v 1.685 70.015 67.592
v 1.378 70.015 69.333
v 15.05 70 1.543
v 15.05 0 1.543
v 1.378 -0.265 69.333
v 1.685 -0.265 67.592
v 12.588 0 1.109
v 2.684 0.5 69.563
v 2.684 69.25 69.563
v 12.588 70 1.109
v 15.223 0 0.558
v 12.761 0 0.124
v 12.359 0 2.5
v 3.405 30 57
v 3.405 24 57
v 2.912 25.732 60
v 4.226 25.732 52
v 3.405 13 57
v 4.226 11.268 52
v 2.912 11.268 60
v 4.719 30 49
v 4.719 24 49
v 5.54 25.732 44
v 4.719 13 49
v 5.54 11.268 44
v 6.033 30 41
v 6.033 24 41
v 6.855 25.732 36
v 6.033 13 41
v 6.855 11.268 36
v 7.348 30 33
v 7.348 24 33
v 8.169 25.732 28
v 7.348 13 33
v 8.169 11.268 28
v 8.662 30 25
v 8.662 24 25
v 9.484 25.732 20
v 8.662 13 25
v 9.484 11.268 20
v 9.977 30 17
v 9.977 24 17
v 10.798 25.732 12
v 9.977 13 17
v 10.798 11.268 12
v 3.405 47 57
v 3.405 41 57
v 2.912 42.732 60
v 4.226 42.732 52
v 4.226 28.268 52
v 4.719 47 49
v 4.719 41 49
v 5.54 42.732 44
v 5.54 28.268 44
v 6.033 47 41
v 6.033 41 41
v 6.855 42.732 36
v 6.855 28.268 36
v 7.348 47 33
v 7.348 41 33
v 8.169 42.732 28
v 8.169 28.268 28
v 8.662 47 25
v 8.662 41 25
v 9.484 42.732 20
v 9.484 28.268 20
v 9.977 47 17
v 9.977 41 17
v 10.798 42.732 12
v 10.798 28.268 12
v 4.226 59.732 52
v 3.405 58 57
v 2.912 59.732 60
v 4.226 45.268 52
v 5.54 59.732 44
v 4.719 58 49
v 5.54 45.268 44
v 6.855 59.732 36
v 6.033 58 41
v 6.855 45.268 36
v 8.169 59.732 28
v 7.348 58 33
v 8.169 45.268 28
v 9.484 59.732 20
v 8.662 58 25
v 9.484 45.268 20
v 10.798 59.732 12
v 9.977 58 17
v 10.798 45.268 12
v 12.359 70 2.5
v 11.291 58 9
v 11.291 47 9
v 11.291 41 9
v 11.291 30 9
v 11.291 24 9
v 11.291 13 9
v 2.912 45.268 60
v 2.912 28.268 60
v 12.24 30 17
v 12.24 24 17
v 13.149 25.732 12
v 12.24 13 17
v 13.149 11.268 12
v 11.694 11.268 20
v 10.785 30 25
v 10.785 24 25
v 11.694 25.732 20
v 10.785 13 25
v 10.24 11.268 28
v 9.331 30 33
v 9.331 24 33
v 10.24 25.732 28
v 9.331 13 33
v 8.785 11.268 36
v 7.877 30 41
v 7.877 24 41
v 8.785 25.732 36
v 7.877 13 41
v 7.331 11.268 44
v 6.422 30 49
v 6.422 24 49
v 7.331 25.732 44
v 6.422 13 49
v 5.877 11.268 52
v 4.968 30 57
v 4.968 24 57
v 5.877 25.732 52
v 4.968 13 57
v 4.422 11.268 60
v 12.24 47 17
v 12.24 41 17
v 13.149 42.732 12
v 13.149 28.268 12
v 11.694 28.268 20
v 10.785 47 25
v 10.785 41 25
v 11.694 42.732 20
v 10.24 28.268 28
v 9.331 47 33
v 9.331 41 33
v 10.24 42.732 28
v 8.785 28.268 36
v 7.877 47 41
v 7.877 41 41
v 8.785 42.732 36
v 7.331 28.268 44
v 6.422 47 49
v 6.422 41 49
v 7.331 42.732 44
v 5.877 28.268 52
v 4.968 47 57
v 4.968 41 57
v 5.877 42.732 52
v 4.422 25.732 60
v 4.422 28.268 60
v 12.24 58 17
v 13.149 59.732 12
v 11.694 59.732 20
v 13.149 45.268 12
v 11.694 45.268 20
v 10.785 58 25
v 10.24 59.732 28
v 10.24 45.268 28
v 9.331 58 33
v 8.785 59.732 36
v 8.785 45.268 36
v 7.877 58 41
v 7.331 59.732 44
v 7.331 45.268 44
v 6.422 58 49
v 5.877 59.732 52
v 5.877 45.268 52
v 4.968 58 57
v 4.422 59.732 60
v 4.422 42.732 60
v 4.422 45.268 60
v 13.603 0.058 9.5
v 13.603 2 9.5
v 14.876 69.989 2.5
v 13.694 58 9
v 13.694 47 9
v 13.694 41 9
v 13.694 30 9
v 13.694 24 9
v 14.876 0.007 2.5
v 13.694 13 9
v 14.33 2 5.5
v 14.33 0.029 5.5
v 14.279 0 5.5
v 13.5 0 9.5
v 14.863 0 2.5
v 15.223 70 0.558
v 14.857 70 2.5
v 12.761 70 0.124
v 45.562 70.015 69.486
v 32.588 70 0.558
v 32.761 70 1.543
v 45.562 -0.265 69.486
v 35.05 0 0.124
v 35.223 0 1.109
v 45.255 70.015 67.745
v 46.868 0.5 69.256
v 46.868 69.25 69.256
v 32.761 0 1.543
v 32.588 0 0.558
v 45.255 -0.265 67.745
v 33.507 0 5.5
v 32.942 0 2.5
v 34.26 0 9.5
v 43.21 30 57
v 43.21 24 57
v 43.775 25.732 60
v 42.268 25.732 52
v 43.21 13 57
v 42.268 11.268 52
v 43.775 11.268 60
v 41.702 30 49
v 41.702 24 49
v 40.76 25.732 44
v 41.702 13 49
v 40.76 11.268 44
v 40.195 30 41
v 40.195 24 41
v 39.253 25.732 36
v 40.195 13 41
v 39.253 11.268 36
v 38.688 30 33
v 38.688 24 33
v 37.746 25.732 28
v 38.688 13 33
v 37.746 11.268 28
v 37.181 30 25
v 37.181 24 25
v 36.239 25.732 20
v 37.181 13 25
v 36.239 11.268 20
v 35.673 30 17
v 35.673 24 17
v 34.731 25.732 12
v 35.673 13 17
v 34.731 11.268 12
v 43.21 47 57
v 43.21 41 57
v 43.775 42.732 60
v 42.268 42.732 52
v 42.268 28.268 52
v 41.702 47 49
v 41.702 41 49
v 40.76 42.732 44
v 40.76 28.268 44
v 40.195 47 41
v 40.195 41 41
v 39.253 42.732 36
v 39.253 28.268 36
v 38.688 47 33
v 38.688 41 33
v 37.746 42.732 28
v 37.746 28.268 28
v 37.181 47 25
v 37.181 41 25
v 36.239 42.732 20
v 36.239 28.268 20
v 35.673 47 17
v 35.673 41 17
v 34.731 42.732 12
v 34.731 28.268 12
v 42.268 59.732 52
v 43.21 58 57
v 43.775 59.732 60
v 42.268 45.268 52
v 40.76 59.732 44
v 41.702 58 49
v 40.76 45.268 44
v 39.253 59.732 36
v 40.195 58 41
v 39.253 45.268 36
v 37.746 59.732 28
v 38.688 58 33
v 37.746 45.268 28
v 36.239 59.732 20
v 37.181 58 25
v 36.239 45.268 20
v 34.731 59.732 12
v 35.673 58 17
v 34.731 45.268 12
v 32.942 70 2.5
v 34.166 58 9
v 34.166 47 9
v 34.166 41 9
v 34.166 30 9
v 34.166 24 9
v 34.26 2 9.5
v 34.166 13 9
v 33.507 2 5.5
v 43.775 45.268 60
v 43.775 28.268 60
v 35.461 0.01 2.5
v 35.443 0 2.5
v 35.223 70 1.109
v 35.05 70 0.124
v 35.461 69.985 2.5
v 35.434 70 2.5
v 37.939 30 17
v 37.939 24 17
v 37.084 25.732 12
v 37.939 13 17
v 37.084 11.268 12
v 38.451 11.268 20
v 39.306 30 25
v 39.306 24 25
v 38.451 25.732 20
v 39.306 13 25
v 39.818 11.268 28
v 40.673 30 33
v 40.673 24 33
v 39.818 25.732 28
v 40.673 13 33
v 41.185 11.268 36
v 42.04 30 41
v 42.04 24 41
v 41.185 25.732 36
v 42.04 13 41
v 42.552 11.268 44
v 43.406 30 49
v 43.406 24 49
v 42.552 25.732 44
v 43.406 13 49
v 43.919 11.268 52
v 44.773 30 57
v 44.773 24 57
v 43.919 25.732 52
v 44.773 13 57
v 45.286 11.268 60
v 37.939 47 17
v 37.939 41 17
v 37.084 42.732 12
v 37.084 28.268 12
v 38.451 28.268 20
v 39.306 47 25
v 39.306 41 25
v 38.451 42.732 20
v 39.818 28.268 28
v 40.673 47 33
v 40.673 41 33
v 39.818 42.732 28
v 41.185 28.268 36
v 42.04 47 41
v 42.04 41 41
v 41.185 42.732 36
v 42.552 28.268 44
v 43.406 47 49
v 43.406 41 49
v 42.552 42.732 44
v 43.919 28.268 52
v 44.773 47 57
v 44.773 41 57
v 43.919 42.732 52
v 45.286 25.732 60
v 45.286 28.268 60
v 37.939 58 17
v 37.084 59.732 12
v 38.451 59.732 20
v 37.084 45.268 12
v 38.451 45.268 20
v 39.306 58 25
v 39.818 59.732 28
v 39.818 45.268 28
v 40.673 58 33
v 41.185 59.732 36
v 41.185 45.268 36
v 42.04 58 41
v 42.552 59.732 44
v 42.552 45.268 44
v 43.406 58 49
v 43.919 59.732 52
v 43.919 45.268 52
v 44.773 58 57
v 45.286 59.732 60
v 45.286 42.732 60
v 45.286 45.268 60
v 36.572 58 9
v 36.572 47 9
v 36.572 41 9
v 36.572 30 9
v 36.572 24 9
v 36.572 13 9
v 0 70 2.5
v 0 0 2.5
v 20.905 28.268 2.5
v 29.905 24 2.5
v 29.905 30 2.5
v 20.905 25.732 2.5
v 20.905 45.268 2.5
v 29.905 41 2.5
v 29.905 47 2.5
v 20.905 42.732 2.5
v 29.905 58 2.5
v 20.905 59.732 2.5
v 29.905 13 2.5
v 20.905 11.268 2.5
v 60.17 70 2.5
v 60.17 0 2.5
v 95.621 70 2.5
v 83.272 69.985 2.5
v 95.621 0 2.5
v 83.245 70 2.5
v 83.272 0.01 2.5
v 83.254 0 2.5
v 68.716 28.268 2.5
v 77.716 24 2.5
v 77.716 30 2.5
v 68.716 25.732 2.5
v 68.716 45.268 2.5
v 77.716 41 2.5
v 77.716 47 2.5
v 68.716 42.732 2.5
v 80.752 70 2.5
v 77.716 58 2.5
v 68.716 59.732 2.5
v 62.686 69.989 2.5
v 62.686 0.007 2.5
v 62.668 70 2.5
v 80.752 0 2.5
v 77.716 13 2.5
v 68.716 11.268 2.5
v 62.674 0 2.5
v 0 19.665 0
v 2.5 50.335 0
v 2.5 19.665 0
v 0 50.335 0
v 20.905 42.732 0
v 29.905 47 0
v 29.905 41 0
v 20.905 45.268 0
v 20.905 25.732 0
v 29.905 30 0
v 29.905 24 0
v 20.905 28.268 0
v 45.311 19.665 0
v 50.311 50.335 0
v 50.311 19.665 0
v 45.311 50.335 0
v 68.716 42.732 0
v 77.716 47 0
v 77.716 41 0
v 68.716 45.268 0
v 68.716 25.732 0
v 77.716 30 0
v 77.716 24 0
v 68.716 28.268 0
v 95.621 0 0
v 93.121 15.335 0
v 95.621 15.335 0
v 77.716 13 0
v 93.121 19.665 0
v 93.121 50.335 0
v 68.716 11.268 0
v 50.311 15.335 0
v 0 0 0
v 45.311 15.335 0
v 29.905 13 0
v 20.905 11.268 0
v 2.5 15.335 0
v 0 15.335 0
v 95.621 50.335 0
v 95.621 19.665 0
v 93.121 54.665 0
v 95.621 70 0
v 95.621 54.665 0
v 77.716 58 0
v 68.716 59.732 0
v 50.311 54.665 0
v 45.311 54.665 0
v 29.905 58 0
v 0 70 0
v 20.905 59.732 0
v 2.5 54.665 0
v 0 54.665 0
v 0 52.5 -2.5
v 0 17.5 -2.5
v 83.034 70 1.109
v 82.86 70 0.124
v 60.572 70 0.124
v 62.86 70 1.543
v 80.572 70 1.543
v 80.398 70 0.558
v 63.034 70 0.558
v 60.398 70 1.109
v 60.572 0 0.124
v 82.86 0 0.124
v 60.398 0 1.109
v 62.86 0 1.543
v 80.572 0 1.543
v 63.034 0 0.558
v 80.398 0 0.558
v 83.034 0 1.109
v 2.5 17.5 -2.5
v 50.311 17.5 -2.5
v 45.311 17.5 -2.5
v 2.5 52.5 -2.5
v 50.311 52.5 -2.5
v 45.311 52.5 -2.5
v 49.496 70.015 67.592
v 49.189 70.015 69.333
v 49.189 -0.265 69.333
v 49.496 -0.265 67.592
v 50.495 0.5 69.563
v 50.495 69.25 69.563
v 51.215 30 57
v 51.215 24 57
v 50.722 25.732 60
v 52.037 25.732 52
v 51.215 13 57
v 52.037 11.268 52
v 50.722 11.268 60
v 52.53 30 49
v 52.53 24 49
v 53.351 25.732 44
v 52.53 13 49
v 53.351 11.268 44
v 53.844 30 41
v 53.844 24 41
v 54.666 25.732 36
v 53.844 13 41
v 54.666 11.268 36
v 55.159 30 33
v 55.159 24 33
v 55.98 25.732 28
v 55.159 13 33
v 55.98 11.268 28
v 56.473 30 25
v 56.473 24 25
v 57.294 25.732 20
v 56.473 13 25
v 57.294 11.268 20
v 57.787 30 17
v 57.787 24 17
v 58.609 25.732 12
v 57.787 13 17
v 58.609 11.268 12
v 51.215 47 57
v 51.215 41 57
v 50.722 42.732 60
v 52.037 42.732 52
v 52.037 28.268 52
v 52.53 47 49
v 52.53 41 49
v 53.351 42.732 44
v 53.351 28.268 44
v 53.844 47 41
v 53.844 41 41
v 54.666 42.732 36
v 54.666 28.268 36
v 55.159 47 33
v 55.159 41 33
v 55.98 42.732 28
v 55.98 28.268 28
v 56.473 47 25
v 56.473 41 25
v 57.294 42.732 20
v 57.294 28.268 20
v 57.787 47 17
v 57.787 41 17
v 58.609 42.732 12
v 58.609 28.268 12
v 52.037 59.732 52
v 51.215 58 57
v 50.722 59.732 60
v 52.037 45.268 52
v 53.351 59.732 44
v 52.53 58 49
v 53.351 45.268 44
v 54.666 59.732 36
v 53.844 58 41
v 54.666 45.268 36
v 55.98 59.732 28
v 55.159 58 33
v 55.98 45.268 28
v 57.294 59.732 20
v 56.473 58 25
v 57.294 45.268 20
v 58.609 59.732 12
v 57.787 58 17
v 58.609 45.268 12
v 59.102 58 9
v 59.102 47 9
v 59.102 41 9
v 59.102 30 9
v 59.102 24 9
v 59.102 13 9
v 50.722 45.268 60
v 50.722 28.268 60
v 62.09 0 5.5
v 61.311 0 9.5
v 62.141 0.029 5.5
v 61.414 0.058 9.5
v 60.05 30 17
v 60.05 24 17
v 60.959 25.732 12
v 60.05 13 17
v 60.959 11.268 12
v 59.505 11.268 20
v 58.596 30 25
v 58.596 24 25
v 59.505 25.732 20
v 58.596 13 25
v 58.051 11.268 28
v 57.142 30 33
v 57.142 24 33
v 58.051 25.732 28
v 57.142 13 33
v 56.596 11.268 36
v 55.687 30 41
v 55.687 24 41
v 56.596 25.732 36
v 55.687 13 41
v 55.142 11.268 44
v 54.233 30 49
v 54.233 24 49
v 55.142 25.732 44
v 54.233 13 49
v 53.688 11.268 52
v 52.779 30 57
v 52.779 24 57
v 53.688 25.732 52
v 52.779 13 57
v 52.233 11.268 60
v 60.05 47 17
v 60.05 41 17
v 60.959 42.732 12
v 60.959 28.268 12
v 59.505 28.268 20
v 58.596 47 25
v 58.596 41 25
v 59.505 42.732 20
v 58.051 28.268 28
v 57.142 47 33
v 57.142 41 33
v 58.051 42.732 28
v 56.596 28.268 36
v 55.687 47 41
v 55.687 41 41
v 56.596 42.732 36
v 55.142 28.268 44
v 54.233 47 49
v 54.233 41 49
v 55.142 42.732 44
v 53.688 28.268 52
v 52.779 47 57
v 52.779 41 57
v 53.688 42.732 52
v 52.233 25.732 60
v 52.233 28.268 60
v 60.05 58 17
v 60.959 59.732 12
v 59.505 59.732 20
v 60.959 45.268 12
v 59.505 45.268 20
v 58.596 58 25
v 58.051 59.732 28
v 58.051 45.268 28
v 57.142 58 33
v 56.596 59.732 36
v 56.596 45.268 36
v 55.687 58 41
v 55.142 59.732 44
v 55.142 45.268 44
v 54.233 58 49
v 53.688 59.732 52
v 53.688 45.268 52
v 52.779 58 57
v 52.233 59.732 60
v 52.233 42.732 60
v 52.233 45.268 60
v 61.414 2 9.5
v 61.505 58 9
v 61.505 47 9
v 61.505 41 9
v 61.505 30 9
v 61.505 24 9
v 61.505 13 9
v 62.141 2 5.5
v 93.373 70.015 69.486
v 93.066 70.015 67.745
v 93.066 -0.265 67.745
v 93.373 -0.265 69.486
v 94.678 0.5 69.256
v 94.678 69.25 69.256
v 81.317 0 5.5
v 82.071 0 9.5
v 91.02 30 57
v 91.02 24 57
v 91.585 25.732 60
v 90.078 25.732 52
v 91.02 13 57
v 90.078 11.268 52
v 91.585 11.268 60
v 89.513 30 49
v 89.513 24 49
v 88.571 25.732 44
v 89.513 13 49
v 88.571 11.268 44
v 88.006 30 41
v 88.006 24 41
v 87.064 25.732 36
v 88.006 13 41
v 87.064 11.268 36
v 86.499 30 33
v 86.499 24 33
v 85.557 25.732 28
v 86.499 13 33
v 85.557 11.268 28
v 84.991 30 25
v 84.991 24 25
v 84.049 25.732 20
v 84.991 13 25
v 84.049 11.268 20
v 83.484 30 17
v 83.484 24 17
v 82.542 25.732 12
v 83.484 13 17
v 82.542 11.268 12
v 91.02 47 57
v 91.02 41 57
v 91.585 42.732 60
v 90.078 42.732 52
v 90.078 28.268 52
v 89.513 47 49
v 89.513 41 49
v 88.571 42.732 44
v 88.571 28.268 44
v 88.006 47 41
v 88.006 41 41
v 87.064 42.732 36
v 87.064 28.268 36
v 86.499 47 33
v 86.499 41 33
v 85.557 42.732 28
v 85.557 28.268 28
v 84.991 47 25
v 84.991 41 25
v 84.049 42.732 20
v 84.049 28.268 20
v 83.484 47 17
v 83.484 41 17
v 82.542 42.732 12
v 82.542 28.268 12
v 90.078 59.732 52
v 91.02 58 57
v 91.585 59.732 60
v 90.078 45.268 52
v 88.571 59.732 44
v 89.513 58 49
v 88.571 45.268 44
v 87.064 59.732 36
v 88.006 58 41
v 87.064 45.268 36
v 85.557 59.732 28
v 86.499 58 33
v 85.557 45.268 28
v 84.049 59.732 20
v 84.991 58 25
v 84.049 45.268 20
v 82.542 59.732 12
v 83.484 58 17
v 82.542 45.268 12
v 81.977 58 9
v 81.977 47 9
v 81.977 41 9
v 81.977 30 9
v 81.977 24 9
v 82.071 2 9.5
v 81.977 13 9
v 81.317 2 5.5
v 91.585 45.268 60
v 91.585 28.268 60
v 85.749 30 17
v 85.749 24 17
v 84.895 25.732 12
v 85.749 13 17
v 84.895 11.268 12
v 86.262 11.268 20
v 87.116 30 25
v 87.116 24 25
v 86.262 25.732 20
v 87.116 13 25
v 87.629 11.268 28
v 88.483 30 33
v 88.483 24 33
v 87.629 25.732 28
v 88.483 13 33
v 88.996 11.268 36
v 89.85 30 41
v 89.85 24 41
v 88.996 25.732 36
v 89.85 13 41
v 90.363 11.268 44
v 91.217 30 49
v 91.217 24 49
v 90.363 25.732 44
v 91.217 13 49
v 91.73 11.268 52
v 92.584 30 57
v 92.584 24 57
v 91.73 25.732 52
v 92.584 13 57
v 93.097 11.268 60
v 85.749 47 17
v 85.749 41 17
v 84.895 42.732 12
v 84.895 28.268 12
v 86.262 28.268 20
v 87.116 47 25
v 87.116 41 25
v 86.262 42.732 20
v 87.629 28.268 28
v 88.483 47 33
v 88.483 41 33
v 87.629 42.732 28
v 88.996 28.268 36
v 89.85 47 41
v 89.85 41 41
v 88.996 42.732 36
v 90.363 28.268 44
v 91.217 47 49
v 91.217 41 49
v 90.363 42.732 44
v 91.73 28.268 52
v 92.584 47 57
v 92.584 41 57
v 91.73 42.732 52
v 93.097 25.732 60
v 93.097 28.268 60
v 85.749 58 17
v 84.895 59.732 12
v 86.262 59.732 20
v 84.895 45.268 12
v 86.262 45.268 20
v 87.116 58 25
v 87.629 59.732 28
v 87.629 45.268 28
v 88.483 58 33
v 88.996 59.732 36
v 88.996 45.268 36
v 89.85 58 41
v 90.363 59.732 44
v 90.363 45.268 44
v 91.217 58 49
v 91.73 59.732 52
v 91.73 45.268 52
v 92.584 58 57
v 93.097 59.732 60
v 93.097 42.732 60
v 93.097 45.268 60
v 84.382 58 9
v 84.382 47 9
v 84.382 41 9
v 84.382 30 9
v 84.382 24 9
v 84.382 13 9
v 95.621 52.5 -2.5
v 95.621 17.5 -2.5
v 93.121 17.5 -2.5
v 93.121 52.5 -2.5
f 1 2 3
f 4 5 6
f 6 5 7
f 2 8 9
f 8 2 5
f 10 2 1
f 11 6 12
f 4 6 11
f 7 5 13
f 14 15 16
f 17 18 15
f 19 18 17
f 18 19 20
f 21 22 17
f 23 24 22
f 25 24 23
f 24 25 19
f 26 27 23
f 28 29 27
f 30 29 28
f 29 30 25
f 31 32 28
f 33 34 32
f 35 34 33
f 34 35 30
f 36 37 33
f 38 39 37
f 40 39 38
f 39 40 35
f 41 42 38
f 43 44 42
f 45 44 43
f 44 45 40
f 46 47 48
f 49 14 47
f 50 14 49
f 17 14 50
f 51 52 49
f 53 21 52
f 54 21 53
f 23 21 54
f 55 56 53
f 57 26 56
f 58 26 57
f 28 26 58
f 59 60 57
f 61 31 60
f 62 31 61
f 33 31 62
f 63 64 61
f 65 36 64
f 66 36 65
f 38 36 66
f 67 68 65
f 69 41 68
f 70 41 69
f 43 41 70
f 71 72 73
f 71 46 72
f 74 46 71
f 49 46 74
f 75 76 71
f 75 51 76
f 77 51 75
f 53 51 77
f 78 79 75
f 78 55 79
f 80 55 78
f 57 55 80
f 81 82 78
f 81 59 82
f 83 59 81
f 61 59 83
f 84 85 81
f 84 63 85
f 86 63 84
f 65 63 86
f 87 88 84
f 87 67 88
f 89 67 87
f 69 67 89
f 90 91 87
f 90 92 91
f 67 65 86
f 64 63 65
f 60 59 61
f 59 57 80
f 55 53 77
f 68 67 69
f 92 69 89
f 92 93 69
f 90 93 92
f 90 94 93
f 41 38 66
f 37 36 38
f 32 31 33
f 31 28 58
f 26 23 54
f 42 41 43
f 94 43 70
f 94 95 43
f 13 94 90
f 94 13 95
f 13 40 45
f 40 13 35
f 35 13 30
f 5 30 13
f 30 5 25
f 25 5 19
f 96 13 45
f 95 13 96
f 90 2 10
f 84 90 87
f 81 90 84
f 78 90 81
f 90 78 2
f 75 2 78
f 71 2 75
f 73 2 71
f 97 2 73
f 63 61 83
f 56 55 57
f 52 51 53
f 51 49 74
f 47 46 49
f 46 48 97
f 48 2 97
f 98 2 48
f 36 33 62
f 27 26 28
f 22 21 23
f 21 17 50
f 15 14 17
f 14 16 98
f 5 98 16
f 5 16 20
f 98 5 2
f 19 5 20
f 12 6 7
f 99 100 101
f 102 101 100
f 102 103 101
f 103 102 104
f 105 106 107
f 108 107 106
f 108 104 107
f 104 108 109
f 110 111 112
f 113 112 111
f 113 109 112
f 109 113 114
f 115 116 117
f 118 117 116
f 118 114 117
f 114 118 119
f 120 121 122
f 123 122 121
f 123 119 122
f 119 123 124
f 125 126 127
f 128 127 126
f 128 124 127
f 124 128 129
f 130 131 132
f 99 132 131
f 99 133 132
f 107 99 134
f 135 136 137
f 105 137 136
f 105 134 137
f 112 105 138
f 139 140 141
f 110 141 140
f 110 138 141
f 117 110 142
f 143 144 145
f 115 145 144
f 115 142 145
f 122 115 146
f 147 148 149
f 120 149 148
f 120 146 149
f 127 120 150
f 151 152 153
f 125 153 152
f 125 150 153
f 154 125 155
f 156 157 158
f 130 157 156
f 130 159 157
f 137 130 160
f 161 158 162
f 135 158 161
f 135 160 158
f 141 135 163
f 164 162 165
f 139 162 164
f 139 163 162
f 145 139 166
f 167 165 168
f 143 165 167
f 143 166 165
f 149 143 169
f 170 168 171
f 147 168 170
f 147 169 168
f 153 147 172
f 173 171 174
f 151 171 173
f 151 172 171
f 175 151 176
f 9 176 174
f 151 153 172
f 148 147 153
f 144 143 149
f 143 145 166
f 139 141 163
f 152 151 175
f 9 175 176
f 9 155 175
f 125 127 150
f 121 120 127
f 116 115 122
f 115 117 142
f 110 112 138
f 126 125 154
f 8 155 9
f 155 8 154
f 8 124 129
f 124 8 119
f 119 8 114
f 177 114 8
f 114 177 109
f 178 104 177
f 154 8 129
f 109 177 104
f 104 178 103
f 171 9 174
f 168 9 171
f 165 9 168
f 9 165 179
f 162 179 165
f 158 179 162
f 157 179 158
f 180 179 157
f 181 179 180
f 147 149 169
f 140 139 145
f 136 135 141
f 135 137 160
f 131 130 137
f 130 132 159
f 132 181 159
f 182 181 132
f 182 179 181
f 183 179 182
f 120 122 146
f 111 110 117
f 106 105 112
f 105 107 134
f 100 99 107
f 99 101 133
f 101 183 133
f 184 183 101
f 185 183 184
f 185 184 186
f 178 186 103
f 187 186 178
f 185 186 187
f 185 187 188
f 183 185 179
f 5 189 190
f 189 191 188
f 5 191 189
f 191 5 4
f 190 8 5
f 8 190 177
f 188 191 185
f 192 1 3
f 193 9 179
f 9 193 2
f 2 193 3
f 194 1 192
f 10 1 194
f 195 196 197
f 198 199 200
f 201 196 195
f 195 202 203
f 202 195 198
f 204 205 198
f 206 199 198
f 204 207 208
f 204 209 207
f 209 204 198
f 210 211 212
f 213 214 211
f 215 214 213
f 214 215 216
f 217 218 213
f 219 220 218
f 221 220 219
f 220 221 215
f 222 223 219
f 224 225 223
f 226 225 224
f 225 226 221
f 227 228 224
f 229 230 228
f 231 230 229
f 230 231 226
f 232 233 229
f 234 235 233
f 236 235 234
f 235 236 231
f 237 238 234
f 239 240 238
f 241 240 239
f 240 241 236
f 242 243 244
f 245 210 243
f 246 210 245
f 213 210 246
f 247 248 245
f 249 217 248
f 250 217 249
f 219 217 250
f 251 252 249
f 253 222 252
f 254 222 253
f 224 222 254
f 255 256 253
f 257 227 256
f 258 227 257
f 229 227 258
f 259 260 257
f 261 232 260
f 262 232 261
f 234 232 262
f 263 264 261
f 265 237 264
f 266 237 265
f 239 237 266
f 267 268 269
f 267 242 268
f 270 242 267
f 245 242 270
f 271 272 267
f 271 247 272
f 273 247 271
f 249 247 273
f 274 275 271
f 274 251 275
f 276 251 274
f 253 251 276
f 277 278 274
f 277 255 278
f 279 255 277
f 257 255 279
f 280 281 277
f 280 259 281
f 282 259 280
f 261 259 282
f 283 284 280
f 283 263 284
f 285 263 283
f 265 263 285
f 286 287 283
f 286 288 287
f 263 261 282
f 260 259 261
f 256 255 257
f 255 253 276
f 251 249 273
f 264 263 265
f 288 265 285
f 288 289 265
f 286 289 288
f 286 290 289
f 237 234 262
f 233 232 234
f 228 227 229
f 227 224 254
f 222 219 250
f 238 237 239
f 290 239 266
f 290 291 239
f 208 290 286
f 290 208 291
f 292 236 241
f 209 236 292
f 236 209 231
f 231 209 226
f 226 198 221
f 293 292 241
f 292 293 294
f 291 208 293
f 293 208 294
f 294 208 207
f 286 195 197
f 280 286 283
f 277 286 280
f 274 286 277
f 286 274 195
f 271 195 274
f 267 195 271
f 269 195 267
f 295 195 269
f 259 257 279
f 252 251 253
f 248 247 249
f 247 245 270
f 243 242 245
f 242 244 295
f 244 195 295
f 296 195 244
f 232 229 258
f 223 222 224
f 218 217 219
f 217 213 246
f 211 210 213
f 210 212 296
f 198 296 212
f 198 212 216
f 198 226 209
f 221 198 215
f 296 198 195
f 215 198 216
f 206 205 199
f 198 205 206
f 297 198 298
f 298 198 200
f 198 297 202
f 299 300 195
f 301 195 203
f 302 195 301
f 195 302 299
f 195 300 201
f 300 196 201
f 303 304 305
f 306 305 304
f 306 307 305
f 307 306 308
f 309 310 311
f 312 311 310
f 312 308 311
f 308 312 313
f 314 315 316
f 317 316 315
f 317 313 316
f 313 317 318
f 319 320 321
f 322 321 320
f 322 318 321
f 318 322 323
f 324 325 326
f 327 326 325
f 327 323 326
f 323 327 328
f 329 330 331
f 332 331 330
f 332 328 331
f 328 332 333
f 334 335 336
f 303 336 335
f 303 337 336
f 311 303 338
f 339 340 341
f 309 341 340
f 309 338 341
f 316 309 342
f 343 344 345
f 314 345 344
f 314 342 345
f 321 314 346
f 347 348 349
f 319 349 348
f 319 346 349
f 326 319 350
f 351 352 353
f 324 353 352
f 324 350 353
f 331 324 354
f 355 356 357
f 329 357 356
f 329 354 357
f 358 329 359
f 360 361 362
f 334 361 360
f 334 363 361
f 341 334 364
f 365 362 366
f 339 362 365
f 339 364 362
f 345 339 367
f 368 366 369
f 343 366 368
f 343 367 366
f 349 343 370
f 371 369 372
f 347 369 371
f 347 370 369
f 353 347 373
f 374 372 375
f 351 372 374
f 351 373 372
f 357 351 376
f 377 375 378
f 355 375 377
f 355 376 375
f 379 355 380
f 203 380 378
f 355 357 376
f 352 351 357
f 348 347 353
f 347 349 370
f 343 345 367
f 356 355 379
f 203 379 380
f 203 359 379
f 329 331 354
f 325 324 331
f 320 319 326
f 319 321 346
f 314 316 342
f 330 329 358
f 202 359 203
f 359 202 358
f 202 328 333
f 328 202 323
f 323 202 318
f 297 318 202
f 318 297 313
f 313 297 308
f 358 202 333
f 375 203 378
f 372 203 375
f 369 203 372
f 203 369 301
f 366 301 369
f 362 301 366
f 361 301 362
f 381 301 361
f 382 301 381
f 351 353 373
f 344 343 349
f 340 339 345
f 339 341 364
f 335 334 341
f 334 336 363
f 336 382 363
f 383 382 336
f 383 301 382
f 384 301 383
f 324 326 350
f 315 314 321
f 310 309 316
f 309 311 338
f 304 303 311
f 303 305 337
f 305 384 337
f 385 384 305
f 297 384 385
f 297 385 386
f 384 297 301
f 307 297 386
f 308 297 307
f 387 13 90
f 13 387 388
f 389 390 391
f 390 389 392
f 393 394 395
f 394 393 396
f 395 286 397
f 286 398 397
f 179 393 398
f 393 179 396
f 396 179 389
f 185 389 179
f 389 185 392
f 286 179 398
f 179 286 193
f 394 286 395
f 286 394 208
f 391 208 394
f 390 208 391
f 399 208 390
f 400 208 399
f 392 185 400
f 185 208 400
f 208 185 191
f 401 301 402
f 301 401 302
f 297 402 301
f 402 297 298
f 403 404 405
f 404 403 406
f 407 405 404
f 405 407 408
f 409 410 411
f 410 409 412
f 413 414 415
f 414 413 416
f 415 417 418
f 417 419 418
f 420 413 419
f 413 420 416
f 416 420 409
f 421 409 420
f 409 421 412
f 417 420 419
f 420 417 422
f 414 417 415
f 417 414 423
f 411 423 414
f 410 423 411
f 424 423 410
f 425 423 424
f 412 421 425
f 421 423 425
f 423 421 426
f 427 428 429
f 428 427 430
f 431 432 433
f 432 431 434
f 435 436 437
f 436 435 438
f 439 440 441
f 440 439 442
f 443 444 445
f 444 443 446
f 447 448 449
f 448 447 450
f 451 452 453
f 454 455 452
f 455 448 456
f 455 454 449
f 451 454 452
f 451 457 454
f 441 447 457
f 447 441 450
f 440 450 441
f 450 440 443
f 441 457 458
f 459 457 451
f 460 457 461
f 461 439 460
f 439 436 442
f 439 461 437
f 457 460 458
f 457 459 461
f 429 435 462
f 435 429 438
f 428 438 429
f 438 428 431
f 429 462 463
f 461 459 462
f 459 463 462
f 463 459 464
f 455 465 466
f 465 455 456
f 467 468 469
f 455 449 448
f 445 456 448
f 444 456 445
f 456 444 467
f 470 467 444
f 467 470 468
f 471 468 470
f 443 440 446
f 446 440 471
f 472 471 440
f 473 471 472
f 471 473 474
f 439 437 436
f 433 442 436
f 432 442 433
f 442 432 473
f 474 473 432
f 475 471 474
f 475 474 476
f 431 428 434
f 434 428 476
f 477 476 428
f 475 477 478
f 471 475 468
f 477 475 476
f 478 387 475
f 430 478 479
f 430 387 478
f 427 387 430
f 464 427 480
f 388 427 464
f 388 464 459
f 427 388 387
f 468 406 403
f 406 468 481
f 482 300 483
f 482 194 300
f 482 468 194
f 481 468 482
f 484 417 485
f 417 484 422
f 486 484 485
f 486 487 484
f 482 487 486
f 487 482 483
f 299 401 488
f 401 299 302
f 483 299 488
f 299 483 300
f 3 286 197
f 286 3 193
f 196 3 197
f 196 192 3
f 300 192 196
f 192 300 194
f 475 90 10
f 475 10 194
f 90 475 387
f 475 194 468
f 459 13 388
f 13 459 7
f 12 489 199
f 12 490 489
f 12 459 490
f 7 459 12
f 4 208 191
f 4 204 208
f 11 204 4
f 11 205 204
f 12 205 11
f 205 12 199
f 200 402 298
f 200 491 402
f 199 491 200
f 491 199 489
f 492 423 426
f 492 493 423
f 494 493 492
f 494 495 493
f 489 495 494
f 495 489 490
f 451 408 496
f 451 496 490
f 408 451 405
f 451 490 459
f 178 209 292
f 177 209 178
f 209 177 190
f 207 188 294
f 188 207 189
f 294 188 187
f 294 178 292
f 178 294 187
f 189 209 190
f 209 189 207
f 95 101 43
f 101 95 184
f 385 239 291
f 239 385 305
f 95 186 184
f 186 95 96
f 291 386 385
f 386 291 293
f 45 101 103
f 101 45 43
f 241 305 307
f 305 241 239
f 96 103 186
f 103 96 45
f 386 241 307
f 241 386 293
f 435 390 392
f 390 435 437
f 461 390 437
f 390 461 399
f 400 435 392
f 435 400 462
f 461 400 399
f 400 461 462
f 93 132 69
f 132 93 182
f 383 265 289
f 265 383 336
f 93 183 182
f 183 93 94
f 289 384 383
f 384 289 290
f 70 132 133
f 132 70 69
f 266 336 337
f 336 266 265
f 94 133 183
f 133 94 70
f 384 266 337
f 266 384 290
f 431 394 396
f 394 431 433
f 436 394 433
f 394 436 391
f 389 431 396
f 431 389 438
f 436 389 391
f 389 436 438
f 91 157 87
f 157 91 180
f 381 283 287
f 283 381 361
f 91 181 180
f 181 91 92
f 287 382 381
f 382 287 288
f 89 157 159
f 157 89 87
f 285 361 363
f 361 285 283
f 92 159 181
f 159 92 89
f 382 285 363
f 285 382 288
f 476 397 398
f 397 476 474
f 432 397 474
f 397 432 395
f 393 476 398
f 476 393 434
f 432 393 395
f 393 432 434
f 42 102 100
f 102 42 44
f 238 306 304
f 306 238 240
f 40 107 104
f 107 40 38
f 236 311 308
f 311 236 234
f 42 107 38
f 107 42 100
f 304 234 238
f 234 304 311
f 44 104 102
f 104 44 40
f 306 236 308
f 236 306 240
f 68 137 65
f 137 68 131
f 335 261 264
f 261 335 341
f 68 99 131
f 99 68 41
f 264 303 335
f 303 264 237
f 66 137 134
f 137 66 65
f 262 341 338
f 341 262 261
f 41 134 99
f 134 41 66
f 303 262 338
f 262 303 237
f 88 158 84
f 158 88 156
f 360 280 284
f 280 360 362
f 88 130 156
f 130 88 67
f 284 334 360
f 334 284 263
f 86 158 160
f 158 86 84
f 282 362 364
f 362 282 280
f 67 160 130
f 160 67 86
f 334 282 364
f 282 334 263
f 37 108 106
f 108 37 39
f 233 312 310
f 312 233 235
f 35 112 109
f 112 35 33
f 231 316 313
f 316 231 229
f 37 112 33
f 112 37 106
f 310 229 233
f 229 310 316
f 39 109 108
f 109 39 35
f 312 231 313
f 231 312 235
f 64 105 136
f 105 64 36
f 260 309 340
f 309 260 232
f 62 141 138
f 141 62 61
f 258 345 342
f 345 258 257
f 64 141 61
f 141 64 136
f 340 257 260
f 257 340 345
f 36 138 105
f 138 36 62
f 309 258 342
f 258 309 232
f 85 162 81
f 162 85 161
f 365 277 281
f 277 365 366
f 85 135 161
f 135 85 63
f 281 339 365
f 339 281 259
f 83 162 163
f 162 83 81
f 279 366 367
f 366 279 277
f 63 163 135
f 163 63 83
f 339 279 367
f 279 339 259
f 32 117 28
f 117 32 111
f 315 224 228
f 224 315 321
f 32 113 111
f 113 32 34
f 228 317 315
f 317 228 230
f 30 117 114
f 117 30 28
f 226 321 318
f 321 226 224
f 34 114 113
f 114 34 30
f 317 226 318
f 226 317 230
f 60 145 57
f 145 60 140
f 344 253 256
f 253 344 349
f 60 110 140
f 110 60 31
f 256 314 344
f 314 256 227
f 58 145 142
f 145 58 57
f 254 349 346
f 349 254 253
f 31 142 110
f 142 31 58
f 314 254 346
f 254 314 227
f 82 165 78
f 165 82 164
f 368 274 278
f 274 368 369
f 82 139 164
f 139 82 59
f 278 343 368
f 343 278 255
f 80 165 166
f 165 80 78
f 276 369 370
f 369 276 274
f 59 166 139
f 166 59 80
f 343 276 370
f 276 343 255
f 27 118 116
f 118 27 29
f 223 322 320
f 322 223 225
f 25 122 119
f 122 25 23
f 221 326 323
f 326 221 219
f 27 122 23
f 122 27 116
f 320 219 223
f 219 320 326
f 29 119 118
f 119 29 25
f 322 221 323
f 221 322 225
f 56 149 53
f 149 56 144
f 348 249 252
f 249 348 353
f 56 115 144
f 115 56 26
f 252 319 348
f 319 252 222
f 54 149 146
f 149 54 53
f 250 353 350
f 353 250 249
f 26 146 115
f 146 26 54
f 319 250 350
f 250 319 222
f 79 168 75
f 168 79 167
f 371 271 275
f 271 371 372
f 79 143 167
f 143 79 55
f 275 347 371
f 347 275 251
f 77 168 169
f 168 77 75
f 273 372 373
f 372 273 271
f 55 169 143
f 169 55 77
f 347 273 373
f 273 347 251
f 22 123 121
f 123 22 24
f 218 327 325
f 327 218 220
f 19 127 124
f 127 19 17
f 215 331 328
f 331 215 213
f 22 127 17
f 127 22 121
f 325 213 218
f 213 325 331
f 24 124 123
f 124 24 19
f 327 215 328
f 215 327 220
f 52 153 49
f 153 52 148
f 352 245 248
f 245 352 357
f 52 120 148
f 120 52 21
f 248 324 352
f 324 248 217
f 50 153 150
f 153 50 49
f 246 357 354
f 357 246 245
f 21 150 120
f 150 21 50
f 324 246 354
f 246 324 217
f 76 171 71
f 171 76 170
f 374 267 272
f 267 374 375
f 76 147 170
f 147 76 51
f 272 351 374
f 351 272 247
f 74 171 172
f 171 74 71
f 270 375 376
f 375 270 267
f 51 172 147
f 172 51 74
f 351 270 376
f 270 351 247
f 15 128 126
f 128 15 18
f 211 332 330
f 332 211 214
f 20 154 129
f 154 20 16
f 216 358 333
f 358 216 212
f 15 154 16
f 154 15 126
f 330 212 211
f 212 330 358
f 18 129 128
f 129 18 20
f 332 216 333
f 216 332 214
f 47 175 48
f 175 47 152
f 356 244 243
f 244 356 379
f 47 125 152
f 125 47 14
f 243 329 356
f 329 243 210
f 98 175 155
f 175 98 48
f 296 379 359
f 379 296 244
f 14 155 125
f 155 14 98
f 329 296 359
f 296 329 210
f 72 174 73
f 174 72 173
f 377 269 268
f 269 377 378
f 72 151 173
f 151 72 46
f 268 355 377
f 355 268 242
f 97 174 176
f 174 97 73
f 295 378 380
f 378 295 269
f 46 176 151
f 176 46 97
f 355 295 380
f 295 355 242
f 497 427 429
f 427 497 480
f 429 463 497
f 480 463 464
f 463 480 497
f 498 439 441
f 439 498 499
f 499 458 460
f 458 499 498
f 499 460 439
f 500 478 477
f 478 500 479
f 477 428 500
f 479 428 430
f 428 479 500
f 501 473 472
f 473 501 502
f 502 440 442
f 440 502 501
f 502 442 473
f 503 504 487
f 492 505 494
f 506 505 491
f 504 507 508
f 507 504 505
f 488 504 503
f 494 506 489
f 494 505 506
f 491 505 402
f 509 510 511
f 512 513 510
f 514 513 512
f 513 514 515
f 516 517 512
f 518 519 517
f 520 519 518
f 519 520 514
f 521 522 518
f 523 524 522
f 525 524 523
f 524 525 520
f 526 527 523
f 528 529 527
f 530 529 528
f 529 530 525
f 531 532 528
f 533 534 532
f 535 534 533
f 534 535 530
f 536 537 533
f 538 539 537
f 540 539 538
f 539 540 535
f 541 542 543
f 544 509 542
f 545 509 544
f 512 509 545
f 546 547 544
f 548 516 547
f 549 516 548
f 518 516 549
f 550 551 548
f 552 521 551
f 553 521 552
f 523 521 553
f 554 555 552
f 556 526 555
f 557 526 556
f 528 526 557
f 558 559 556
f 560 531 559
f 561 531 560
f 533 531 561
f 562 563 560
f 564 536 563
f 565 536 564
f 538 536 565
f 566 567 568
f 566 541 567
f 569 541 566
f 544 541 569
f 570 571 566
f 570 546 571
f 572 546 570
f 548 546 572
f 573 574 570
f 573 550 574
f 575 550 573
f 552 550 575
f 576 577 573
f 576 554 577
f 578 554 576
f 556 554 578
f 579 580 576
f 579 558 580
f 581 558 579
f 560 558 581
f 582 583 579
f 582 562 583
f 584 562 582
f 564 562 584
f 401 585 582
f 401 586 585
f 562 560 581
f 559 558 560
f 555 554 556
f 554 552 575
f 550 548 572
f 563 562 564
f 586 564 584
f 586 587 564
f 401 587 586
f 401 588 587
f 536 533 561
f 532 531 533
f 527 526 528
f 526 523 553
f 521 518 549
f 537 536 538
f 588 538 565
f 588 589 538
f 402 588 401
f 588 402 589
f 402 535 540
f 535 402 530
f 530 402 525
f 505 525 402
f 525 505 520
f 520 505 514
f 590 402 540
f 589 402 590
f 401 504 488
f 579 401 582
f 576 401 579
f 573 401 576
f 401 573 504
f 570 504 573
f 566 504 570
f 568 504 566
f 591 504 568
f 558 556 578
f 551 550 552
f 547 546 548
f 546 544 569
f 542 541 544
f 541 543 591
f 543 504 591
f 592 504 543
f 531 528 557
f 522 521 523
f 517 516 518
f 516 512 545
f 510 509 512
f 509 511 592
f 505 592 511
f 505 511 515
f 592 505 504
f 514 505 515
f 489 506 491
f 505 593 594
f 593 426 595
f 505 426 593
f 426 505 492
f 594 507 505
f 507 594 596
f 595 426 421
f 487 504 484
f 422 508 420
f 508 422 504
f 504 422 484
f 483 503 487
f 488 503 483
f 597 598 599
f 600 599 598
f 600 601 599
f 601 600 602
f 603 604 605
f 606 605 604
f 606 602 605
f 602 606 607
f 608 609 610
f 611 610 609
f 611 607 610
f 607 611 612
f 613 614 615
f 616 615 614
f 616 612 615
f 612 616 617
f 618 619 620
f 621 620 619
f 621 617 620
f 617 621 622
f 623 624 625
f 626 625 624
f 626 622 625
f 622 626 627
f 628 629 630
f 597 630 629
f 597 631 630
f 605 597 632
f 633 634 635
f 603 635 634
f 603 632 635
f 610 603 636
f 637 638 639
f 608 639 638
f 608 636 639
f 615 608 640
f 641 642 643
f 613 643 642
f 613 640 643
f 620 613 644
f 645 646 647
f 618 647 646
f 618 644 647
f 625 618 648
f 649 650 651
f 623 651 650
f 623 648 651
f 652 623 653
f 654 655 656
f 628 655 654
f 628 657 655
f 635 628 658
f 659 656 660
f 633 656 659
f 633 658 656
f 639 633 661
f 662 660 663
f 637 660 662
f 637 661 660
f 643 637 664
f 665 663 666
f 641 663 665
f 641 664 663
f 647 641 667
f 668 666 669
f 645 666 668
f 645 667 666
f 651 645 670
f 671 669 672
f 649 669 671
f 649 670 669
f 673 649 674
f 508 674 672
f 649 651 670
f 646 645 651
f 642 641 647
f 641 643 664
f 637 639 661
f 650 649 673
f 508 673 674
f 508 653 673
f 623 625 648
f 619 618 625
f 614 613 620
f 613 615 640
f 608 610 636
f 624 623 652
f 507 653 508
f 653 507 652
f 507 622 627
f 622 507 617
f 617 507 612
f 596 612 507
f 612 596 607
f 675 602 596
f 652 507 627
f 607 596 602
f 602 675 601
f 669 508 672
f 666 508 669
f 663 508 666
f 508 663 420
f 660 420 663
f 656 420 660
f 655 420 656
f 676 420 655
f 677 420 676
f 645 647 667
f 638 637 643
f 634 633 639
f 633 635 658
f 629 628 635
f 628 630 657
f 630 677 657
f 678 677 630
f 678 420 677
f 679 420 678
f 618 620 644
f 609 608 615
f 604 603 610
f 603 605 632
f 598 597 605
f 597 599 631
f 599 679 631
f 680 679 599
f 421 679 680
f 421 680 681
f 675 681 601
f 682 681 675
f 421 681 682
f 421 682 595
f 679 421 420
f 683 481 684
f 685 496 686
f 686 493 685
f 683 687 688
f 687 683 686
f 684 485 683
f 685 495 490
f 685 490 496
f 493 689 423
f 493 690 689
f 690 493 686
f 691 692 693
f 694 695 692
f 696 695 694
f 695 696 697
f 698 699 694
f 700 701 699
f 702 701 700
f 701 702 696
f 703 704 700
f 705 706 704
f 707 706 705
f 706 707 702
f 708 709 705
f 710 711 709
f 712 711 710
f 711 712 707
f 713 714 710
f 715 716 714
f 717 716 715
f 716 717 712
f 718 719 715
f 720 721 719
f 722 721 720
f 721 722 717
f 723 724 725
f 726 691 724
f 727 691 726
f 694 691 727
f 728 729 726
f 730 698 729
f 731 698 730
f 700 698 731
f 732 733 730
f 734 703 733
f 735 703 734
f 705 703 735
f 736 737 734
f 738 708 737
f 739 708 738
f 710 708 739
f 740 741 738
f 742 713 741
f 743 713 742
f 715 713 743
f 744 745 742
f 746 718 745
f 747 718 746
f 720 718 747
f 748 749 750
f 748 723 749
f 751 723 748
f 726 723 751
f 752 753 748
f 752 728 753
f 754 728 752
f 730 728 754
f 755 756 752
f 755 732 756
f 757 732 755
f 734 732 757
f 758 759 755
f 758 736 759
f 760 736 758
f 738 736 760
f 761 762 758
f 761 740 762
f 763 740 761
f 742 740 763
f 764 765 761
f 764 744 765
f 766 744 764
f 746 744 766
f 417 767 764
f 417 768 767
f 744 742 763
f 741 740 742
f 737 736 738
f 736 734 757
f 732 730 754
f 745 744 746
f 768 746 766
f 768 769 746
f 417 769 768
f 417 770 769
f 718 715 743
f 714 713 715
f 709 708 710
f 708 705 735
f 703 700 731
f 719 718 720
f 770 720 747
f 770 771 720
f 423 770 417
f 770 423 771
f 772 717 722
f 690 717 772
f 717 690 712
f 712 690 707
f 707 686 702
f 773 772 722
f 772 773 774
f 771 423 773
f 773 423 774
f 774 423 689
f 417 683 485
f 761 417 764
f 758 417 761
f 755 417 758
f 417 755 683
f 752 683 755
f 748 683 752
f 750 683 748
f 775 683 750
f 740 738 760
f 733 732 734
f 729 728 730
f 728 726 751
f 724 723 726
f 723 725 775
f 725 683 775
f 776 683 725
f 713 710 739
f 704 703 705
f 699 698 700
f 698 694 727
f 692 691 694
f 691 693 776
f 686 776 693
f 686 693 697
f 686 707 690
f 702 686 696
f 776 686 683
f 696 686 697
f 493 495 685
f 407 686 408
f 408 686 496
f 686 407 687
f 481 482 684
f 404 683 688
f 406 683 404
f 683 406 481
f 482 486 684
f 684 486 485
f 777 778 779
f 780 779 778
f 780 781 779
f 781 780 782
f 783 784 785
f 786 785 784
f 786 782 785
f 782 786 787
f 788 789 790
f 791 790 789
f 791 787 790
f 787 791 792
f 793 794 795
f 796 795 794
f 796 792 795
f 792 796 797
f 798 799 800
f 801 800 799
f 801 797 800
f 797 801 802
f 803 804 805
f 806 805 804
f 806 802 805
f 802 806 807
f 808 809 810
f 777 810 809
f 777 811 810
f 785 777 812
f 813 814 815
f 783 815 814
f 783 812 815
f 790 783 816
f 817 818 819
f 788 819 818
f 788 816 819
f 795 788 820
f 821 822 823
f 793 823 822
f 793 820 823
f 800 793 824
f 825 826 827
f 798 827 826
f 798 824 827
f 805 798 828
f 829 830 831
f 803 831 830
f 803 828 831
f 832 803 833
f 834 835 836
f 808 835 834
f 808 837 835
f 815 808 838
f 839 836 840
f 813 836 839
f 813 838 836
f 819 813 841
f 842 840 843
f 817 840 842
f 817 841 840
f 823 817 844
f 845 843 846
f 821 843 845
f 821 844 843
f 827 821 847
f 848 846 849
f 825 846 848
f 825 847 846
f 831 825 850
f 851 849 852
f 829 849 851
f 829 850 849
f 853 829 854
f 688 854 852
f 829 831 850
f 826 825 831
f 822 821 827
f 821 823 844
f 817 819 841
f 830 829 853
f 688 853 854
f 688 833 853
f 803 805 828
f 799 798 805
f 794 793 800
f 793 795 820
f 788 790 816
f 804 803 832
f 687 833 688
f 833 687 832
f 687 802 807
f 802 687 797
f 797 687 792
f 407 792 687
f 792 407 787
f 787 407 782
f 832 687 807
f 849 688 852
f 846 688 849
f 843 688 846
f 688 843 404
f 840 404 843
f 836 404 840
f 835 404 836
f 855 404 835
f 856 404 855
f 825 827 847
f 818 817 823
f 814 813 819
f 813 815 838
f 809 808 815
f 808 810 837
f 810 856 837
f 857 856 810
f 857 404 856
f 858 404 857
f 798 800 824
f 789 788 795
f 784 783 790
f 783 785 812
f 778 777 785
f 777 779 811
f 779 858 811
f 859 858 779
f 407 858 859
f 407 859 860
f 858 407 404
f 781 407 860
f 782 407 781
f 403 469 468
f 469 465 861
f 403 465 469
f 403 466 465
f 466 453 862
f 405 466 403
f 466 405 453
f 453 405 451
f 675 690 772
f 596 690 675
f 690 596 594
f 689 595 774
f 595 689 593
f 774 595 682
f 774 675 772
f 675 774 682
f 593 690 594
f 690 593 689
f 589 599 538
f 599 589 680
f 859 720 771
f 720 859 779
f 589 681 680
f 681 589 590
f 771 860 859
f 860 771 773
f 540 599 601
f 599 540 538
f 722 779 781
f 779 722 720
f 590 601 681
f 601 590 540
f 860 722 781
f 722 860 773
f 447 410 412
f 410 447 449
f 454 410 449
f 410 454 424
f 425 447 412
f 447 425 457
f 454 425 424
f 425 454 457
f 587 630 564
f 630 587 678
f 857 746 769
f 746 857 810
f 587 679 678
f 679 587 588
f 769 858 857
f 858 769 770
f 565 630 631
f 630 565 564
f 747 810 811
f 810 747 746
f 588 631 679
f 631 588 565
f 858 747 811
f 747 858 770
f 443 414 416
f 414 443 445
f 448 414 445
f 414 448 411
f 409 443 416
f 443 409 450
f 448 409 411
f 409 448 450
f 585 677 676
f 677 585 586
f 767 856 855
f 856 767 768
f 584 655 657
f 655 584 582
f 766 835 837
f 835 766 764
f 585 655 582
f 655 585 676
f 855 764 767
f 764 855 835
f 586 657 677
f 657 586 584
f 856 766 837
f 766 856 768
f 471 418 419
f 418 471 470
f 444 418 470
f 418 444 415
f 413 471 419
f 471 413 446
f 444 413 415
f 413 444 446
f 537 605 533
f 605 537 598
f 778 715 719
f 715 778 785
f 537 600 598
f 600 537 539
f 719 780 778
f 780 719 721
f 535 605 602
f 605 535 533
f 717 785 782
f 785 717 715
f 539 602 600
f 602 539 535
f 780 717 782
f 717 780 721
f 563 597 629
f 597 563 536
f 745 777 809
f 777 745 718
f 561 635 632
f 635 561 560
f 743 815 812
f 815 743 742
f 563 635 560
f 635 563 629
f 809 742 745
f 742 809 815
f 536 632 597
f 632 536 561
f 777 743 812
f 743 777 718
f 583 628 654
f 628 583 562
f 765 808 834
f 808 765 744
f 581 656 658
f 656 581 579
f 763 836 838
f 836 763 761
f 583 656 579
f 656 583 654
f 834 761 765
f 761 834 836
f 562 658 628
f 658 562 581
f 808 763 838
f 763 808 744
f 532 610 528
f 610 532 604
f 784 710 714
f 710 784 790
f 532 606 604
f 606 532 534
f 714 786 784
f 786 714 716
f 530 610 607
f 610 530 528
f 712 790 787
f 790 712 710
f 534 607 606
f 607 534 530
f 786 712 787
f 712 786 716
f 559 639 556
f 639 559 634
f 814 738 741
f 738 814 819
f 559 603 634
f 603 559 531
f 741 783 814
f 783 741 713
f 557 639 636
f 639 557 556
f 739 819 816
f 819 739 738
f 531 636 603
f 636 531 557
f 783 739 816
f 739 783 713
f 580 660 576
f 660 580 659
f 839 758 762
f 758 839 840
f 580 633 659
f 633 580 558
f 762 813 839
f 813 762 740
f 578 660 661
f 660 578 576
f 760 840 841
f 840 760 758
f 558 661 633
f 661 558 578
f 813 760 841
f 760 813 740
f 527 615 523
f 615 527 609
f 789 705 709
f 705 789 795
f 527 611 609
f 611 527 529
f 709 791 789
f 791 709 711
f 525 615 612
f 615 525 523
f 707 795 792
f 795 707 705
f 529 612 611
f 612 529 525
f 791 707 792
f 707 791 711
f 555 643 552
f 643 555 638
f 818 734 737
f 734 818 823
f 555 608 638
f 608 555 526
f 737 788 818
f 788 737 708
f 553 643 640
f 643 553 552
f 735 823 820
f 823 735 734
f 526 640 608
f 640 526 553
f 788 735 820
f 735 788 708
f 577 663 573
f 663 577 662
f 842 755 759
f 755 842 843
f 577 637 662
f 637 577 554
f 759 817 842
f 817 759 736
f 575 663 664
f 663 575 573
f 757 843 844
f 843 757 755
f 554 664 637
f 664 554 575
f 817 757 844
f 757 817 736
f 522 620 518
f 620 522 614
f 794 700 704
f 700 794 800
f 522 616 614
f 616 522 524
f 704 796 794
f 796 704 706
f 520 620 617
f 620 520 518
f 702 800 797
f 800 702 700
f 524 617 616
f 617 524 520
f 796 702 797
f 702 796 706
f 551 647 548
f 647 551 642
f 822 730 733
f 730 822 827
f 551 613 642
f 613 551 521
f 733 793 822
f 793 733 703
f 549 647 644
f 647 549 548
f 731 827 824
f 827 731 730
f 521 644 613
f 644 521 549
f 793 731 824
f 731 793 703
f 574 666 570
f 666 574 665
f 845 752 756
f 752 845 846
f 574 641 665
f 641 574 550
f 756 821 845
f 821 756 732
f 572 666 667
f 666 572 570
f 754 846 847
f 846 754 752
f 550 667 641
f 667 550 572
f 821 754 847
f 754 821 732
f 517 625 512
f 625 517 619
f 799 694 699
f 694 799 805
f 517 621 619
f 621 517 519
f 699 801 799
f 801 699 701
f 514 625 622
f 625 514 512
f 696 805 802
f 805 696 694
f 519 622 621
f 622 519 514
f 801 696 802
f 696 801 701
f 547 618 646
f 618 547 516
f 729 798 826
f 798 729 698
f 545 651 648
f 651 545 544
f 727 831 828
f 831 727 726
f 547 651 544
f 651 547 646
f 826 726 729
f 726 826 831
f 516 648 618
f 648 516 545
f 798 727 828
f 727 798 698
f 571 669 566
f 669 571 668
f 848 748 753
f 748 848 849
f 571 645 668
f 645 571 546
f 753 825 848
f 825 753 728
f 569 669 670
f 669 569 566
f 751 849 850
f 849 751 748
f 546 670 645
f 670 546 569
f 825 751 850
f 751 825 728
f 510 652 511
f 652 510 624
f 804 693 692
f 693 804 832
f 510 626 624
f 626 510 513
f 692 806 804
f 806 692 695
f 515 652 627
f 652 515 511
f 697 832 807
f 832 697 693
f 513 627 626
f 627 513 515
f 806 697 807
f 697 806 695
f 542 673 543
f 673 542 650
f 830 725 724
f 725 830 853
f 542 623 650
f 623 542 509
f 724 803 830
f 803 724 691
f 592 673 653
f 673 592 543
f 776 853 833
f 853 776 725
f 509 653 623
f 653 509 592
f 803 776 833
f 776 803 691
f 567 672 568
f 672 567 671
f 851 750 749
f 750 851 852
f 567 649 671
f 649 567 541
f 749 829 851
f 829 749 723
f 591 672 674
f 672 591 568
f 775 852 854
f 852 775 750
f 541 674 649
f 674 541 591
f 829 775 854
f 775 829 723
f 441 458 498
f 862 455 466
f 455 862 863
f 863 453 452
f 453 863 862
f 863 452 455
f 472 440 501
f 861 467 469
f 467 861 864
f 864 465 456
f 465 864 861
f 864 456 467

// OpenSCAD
$fn=50/15;
spongecount=2;
sponge1depth=70;
sponge2depth=70;
sponge3depth=100;
sponge1angle=80;
sponge2angle=80;
sponge3angle=80;
sponge1thickness=2.5;
sponge2thickness=2.5;
sponge3thickness=2.5;
sponge1height=70;
sponge2height=70;
sponge3height=58;
sponge1width=20;
sponge2width=20;
sponge3width=20;
spongespacer=7;
basethickness=2.5;
depth=max(sponge1depth,sponge2depth,sponge3depth);
sponge1adj=(cos(sponge1angle)* sponge1height);
sponge2adj=(cos(sponge2angle)* sponge2height);
sponge3adj=(cos(sponge3angle)* sponge3height);
width1=(sponge1adj*2)+sponge1width+spongespacer/2;
width2=(sponge2adj*2)+sponge2width+spongespacer/2;
width3=(sponge3adj*2)+sponge3width+spongespacer/2;
vertholewidth=15;
vertholewidthspacer=2;
vertholewidthspace=vertholewidth+vertholewidthspacer;
vertholeheight=4;
vertholeheightspacer=4;
vertholeheightspace=vertholeheight+vertholeheightspacer;
vertholeedge=4;
sponge1supportwidth=sponge1width+sponge1thickness;
sponge2supportwidth=sponge2width+sponge2thickness;
sponge3supportwidth=sponge3width+sponge3thickness;
sponge1supportheight=4;
sponge2supportheight=4;
sponge3supportheight=4;
sponge1supportdepth=2;
sponge2supportdepth=2;
sponge3supportdepth=2;
sponge1supporthole=3;
sponge2supporthole=3;
sponge3supporthole=3;
spongeholeratio=3;




module spongearm (move,spongeadj,spongespacer,spongethickness,spongedepth, spongeheight,spongeangle){
    rotate([0,spongeangle,0]) hull(){
        cube([spongethickness,1,1], center=true);
        translate([0,spongedepth-1,0]) cube([spongethickness,1,1], center=true);
        translate([0,0,spongeheight-spongethickness/2]) sphere(d=spongethickness, center=true);
        translate([0,spongedepth-spongethickness/2,spongeheight-spongethickness/2]) sphere(d=spongethickness, center=true);
    }
}

module spongeholder(move,spongespacer,basewidth,spongedepth,basethickness,spongeadj,spongeangle,spongethickness,spongeheight,spongewidth,spongesupportheight,spongesupportwidth,spongesupportdepth,spongesupporthole) {
    union(){
        difference() {
            union(){
                translate([move+spongeadj+spongespacer/4,.5,basethickness/3]) spongearm(move,spongeadj,spongespacer,spongethickness,spongedepth,spongeheight,spongeangle-90);
                translate([move+spongeadj+spongewidth+spongespacer/4,.5,basethickness/3])spongearm(move+spongewidth,spongeadj,spongespacer,spongethickness,spongedepth,spongeheight,10);
                translate([move,0,0]) cube([basewidth,spongedepth,basethickness]);
                translate([move+basewidth/2,spongesupportdepth/2,basethickness+spongesupportheight/2+spongesupporthole]) cube([spongesupportwidth,spongesupportdepth,spongesupportheight], center=true);
            }
            translate([move,0,-spongeheight]) cube([basewidth,spongedepth,spongeheight]);
 
            numiverthole=floor((spongeheight-vertholeedge-basethickness)/vertholeheightspace)+1;
            for (i=[spongeheight-numiverthole*vertholeheightspace-((spongeheight-numiverthole*vertholeheightspace)/2)+vertholeedge*2:vertholeheightspace:numiverthole*vertholeheightspace]){     //for (i=[3+basethickness: 7 : spongeheight]){


                numjverthole=floor((spongedepth-vertholeedge*2)/vertholewidthspace)+1;
                for (j=[(spongedepth-vertholeedge*2-(numjverthole-1)*vertholewidthspace )-((spongedepth-numjverthole*vertholewidthspace)/2)+vertholewidthspacer/2+vertholeheight/2:vertholewidthspace:numjverthole*vertholewidthspace]) {
                    echo("J");
                    echo(i,j,spongedepth,numjverthole,vertholeedge,vertholewidthspace,spongedepth-vertholeedge*2,(spongedepth-vertholeedge*2)/vertholewidthspace );
        
                    if((i+vertholeedge+vertholeheight<=spongeheight)) {
                        if(j+vertholewidth<=spongedepth){
                            echo("make");
                            translate([move+basewidth/2,j,i]) {
                                hull(){
                                    rotate([0,90,0]) cylinder(d=vertholeheight,h=basewidth, center=true);
                                    translate([0,vertholewidth-vertholeheight,0]) rotate([0,90,0]) cylinder(d=vertholeheight, h=basewidth, center=true);
                                }
                            }
                            translate([move+spongeadj+spongewidth/2+spongespacer/4,j,0]) {
                                //need to fix scale here to use variables
                                scale([spongeholeratio,1,1]) 
                                hull(){
                                    cylinder(d=vertholeheight,h=basewidth, center=true);
                                    translate([0,vertholewidth-vertholeheight,0]) cylinder(d=vertholeheight, h=basewidth, center=true);
                                }
                            }
                            
                            
                            
                        }
                    }
                }
            } 
        }
        translate([move,spongedepth/4,0]) scale([1,1.5,1]) rotate([0,90,0]) cylinder(r=basethickness,h=basethickness);
        translate([move+basewidth-basethickness,spongedepth/4,0]) scale([1,1.5,1]) rotate([0,90,0]) cylinder(r=basethickness,h=basethickness);
        translate([move,spongedepth/4*3,0]) scale([1,1.5,1]) rotate([0,90,0]) cylinder(r=basethickness,h=basethickness);
        translate([move+basewidth-basethickness,spongedepth/4*3,0]) scale([1,1.5,1]) rotate([0,90,0]) cylinder(r=basethickness,h=basethickness);
    }
}

module makesponge(){
    union(){
        spongeholder(0,spongespacer,width1,sponge1depth,basethickness,sponge1adj,sponge1angle,sponge1thickness,sponge1height,sponge1width,sponge1supportheight,sponge1supportwidth,sponge1supportdepth,sponge1supporthole);
        if (spongecount>1) {
            spongeholder(width1,spongespacer,width2,sponge2depth,basethickness,sponge2adj,sponge2angle,sponge2thickness,sponge2height,sponge2width,sponge2supportheight,sponge2supportwidth,sponge2supportdepth,sponge2supporthole);
        }
        if (spongecount>2){
            spongeholder(width1+width2,spongespacer,width3,sponge3depth,basethickness,sponge3adj,sponge3angle,sponge3thickness,sponge3height,sponge3width,sponge3supportheight,sponge3supportwidth,sponge3supportdepth,sponge3supporthole);
        }
    }
}



makesponge();
